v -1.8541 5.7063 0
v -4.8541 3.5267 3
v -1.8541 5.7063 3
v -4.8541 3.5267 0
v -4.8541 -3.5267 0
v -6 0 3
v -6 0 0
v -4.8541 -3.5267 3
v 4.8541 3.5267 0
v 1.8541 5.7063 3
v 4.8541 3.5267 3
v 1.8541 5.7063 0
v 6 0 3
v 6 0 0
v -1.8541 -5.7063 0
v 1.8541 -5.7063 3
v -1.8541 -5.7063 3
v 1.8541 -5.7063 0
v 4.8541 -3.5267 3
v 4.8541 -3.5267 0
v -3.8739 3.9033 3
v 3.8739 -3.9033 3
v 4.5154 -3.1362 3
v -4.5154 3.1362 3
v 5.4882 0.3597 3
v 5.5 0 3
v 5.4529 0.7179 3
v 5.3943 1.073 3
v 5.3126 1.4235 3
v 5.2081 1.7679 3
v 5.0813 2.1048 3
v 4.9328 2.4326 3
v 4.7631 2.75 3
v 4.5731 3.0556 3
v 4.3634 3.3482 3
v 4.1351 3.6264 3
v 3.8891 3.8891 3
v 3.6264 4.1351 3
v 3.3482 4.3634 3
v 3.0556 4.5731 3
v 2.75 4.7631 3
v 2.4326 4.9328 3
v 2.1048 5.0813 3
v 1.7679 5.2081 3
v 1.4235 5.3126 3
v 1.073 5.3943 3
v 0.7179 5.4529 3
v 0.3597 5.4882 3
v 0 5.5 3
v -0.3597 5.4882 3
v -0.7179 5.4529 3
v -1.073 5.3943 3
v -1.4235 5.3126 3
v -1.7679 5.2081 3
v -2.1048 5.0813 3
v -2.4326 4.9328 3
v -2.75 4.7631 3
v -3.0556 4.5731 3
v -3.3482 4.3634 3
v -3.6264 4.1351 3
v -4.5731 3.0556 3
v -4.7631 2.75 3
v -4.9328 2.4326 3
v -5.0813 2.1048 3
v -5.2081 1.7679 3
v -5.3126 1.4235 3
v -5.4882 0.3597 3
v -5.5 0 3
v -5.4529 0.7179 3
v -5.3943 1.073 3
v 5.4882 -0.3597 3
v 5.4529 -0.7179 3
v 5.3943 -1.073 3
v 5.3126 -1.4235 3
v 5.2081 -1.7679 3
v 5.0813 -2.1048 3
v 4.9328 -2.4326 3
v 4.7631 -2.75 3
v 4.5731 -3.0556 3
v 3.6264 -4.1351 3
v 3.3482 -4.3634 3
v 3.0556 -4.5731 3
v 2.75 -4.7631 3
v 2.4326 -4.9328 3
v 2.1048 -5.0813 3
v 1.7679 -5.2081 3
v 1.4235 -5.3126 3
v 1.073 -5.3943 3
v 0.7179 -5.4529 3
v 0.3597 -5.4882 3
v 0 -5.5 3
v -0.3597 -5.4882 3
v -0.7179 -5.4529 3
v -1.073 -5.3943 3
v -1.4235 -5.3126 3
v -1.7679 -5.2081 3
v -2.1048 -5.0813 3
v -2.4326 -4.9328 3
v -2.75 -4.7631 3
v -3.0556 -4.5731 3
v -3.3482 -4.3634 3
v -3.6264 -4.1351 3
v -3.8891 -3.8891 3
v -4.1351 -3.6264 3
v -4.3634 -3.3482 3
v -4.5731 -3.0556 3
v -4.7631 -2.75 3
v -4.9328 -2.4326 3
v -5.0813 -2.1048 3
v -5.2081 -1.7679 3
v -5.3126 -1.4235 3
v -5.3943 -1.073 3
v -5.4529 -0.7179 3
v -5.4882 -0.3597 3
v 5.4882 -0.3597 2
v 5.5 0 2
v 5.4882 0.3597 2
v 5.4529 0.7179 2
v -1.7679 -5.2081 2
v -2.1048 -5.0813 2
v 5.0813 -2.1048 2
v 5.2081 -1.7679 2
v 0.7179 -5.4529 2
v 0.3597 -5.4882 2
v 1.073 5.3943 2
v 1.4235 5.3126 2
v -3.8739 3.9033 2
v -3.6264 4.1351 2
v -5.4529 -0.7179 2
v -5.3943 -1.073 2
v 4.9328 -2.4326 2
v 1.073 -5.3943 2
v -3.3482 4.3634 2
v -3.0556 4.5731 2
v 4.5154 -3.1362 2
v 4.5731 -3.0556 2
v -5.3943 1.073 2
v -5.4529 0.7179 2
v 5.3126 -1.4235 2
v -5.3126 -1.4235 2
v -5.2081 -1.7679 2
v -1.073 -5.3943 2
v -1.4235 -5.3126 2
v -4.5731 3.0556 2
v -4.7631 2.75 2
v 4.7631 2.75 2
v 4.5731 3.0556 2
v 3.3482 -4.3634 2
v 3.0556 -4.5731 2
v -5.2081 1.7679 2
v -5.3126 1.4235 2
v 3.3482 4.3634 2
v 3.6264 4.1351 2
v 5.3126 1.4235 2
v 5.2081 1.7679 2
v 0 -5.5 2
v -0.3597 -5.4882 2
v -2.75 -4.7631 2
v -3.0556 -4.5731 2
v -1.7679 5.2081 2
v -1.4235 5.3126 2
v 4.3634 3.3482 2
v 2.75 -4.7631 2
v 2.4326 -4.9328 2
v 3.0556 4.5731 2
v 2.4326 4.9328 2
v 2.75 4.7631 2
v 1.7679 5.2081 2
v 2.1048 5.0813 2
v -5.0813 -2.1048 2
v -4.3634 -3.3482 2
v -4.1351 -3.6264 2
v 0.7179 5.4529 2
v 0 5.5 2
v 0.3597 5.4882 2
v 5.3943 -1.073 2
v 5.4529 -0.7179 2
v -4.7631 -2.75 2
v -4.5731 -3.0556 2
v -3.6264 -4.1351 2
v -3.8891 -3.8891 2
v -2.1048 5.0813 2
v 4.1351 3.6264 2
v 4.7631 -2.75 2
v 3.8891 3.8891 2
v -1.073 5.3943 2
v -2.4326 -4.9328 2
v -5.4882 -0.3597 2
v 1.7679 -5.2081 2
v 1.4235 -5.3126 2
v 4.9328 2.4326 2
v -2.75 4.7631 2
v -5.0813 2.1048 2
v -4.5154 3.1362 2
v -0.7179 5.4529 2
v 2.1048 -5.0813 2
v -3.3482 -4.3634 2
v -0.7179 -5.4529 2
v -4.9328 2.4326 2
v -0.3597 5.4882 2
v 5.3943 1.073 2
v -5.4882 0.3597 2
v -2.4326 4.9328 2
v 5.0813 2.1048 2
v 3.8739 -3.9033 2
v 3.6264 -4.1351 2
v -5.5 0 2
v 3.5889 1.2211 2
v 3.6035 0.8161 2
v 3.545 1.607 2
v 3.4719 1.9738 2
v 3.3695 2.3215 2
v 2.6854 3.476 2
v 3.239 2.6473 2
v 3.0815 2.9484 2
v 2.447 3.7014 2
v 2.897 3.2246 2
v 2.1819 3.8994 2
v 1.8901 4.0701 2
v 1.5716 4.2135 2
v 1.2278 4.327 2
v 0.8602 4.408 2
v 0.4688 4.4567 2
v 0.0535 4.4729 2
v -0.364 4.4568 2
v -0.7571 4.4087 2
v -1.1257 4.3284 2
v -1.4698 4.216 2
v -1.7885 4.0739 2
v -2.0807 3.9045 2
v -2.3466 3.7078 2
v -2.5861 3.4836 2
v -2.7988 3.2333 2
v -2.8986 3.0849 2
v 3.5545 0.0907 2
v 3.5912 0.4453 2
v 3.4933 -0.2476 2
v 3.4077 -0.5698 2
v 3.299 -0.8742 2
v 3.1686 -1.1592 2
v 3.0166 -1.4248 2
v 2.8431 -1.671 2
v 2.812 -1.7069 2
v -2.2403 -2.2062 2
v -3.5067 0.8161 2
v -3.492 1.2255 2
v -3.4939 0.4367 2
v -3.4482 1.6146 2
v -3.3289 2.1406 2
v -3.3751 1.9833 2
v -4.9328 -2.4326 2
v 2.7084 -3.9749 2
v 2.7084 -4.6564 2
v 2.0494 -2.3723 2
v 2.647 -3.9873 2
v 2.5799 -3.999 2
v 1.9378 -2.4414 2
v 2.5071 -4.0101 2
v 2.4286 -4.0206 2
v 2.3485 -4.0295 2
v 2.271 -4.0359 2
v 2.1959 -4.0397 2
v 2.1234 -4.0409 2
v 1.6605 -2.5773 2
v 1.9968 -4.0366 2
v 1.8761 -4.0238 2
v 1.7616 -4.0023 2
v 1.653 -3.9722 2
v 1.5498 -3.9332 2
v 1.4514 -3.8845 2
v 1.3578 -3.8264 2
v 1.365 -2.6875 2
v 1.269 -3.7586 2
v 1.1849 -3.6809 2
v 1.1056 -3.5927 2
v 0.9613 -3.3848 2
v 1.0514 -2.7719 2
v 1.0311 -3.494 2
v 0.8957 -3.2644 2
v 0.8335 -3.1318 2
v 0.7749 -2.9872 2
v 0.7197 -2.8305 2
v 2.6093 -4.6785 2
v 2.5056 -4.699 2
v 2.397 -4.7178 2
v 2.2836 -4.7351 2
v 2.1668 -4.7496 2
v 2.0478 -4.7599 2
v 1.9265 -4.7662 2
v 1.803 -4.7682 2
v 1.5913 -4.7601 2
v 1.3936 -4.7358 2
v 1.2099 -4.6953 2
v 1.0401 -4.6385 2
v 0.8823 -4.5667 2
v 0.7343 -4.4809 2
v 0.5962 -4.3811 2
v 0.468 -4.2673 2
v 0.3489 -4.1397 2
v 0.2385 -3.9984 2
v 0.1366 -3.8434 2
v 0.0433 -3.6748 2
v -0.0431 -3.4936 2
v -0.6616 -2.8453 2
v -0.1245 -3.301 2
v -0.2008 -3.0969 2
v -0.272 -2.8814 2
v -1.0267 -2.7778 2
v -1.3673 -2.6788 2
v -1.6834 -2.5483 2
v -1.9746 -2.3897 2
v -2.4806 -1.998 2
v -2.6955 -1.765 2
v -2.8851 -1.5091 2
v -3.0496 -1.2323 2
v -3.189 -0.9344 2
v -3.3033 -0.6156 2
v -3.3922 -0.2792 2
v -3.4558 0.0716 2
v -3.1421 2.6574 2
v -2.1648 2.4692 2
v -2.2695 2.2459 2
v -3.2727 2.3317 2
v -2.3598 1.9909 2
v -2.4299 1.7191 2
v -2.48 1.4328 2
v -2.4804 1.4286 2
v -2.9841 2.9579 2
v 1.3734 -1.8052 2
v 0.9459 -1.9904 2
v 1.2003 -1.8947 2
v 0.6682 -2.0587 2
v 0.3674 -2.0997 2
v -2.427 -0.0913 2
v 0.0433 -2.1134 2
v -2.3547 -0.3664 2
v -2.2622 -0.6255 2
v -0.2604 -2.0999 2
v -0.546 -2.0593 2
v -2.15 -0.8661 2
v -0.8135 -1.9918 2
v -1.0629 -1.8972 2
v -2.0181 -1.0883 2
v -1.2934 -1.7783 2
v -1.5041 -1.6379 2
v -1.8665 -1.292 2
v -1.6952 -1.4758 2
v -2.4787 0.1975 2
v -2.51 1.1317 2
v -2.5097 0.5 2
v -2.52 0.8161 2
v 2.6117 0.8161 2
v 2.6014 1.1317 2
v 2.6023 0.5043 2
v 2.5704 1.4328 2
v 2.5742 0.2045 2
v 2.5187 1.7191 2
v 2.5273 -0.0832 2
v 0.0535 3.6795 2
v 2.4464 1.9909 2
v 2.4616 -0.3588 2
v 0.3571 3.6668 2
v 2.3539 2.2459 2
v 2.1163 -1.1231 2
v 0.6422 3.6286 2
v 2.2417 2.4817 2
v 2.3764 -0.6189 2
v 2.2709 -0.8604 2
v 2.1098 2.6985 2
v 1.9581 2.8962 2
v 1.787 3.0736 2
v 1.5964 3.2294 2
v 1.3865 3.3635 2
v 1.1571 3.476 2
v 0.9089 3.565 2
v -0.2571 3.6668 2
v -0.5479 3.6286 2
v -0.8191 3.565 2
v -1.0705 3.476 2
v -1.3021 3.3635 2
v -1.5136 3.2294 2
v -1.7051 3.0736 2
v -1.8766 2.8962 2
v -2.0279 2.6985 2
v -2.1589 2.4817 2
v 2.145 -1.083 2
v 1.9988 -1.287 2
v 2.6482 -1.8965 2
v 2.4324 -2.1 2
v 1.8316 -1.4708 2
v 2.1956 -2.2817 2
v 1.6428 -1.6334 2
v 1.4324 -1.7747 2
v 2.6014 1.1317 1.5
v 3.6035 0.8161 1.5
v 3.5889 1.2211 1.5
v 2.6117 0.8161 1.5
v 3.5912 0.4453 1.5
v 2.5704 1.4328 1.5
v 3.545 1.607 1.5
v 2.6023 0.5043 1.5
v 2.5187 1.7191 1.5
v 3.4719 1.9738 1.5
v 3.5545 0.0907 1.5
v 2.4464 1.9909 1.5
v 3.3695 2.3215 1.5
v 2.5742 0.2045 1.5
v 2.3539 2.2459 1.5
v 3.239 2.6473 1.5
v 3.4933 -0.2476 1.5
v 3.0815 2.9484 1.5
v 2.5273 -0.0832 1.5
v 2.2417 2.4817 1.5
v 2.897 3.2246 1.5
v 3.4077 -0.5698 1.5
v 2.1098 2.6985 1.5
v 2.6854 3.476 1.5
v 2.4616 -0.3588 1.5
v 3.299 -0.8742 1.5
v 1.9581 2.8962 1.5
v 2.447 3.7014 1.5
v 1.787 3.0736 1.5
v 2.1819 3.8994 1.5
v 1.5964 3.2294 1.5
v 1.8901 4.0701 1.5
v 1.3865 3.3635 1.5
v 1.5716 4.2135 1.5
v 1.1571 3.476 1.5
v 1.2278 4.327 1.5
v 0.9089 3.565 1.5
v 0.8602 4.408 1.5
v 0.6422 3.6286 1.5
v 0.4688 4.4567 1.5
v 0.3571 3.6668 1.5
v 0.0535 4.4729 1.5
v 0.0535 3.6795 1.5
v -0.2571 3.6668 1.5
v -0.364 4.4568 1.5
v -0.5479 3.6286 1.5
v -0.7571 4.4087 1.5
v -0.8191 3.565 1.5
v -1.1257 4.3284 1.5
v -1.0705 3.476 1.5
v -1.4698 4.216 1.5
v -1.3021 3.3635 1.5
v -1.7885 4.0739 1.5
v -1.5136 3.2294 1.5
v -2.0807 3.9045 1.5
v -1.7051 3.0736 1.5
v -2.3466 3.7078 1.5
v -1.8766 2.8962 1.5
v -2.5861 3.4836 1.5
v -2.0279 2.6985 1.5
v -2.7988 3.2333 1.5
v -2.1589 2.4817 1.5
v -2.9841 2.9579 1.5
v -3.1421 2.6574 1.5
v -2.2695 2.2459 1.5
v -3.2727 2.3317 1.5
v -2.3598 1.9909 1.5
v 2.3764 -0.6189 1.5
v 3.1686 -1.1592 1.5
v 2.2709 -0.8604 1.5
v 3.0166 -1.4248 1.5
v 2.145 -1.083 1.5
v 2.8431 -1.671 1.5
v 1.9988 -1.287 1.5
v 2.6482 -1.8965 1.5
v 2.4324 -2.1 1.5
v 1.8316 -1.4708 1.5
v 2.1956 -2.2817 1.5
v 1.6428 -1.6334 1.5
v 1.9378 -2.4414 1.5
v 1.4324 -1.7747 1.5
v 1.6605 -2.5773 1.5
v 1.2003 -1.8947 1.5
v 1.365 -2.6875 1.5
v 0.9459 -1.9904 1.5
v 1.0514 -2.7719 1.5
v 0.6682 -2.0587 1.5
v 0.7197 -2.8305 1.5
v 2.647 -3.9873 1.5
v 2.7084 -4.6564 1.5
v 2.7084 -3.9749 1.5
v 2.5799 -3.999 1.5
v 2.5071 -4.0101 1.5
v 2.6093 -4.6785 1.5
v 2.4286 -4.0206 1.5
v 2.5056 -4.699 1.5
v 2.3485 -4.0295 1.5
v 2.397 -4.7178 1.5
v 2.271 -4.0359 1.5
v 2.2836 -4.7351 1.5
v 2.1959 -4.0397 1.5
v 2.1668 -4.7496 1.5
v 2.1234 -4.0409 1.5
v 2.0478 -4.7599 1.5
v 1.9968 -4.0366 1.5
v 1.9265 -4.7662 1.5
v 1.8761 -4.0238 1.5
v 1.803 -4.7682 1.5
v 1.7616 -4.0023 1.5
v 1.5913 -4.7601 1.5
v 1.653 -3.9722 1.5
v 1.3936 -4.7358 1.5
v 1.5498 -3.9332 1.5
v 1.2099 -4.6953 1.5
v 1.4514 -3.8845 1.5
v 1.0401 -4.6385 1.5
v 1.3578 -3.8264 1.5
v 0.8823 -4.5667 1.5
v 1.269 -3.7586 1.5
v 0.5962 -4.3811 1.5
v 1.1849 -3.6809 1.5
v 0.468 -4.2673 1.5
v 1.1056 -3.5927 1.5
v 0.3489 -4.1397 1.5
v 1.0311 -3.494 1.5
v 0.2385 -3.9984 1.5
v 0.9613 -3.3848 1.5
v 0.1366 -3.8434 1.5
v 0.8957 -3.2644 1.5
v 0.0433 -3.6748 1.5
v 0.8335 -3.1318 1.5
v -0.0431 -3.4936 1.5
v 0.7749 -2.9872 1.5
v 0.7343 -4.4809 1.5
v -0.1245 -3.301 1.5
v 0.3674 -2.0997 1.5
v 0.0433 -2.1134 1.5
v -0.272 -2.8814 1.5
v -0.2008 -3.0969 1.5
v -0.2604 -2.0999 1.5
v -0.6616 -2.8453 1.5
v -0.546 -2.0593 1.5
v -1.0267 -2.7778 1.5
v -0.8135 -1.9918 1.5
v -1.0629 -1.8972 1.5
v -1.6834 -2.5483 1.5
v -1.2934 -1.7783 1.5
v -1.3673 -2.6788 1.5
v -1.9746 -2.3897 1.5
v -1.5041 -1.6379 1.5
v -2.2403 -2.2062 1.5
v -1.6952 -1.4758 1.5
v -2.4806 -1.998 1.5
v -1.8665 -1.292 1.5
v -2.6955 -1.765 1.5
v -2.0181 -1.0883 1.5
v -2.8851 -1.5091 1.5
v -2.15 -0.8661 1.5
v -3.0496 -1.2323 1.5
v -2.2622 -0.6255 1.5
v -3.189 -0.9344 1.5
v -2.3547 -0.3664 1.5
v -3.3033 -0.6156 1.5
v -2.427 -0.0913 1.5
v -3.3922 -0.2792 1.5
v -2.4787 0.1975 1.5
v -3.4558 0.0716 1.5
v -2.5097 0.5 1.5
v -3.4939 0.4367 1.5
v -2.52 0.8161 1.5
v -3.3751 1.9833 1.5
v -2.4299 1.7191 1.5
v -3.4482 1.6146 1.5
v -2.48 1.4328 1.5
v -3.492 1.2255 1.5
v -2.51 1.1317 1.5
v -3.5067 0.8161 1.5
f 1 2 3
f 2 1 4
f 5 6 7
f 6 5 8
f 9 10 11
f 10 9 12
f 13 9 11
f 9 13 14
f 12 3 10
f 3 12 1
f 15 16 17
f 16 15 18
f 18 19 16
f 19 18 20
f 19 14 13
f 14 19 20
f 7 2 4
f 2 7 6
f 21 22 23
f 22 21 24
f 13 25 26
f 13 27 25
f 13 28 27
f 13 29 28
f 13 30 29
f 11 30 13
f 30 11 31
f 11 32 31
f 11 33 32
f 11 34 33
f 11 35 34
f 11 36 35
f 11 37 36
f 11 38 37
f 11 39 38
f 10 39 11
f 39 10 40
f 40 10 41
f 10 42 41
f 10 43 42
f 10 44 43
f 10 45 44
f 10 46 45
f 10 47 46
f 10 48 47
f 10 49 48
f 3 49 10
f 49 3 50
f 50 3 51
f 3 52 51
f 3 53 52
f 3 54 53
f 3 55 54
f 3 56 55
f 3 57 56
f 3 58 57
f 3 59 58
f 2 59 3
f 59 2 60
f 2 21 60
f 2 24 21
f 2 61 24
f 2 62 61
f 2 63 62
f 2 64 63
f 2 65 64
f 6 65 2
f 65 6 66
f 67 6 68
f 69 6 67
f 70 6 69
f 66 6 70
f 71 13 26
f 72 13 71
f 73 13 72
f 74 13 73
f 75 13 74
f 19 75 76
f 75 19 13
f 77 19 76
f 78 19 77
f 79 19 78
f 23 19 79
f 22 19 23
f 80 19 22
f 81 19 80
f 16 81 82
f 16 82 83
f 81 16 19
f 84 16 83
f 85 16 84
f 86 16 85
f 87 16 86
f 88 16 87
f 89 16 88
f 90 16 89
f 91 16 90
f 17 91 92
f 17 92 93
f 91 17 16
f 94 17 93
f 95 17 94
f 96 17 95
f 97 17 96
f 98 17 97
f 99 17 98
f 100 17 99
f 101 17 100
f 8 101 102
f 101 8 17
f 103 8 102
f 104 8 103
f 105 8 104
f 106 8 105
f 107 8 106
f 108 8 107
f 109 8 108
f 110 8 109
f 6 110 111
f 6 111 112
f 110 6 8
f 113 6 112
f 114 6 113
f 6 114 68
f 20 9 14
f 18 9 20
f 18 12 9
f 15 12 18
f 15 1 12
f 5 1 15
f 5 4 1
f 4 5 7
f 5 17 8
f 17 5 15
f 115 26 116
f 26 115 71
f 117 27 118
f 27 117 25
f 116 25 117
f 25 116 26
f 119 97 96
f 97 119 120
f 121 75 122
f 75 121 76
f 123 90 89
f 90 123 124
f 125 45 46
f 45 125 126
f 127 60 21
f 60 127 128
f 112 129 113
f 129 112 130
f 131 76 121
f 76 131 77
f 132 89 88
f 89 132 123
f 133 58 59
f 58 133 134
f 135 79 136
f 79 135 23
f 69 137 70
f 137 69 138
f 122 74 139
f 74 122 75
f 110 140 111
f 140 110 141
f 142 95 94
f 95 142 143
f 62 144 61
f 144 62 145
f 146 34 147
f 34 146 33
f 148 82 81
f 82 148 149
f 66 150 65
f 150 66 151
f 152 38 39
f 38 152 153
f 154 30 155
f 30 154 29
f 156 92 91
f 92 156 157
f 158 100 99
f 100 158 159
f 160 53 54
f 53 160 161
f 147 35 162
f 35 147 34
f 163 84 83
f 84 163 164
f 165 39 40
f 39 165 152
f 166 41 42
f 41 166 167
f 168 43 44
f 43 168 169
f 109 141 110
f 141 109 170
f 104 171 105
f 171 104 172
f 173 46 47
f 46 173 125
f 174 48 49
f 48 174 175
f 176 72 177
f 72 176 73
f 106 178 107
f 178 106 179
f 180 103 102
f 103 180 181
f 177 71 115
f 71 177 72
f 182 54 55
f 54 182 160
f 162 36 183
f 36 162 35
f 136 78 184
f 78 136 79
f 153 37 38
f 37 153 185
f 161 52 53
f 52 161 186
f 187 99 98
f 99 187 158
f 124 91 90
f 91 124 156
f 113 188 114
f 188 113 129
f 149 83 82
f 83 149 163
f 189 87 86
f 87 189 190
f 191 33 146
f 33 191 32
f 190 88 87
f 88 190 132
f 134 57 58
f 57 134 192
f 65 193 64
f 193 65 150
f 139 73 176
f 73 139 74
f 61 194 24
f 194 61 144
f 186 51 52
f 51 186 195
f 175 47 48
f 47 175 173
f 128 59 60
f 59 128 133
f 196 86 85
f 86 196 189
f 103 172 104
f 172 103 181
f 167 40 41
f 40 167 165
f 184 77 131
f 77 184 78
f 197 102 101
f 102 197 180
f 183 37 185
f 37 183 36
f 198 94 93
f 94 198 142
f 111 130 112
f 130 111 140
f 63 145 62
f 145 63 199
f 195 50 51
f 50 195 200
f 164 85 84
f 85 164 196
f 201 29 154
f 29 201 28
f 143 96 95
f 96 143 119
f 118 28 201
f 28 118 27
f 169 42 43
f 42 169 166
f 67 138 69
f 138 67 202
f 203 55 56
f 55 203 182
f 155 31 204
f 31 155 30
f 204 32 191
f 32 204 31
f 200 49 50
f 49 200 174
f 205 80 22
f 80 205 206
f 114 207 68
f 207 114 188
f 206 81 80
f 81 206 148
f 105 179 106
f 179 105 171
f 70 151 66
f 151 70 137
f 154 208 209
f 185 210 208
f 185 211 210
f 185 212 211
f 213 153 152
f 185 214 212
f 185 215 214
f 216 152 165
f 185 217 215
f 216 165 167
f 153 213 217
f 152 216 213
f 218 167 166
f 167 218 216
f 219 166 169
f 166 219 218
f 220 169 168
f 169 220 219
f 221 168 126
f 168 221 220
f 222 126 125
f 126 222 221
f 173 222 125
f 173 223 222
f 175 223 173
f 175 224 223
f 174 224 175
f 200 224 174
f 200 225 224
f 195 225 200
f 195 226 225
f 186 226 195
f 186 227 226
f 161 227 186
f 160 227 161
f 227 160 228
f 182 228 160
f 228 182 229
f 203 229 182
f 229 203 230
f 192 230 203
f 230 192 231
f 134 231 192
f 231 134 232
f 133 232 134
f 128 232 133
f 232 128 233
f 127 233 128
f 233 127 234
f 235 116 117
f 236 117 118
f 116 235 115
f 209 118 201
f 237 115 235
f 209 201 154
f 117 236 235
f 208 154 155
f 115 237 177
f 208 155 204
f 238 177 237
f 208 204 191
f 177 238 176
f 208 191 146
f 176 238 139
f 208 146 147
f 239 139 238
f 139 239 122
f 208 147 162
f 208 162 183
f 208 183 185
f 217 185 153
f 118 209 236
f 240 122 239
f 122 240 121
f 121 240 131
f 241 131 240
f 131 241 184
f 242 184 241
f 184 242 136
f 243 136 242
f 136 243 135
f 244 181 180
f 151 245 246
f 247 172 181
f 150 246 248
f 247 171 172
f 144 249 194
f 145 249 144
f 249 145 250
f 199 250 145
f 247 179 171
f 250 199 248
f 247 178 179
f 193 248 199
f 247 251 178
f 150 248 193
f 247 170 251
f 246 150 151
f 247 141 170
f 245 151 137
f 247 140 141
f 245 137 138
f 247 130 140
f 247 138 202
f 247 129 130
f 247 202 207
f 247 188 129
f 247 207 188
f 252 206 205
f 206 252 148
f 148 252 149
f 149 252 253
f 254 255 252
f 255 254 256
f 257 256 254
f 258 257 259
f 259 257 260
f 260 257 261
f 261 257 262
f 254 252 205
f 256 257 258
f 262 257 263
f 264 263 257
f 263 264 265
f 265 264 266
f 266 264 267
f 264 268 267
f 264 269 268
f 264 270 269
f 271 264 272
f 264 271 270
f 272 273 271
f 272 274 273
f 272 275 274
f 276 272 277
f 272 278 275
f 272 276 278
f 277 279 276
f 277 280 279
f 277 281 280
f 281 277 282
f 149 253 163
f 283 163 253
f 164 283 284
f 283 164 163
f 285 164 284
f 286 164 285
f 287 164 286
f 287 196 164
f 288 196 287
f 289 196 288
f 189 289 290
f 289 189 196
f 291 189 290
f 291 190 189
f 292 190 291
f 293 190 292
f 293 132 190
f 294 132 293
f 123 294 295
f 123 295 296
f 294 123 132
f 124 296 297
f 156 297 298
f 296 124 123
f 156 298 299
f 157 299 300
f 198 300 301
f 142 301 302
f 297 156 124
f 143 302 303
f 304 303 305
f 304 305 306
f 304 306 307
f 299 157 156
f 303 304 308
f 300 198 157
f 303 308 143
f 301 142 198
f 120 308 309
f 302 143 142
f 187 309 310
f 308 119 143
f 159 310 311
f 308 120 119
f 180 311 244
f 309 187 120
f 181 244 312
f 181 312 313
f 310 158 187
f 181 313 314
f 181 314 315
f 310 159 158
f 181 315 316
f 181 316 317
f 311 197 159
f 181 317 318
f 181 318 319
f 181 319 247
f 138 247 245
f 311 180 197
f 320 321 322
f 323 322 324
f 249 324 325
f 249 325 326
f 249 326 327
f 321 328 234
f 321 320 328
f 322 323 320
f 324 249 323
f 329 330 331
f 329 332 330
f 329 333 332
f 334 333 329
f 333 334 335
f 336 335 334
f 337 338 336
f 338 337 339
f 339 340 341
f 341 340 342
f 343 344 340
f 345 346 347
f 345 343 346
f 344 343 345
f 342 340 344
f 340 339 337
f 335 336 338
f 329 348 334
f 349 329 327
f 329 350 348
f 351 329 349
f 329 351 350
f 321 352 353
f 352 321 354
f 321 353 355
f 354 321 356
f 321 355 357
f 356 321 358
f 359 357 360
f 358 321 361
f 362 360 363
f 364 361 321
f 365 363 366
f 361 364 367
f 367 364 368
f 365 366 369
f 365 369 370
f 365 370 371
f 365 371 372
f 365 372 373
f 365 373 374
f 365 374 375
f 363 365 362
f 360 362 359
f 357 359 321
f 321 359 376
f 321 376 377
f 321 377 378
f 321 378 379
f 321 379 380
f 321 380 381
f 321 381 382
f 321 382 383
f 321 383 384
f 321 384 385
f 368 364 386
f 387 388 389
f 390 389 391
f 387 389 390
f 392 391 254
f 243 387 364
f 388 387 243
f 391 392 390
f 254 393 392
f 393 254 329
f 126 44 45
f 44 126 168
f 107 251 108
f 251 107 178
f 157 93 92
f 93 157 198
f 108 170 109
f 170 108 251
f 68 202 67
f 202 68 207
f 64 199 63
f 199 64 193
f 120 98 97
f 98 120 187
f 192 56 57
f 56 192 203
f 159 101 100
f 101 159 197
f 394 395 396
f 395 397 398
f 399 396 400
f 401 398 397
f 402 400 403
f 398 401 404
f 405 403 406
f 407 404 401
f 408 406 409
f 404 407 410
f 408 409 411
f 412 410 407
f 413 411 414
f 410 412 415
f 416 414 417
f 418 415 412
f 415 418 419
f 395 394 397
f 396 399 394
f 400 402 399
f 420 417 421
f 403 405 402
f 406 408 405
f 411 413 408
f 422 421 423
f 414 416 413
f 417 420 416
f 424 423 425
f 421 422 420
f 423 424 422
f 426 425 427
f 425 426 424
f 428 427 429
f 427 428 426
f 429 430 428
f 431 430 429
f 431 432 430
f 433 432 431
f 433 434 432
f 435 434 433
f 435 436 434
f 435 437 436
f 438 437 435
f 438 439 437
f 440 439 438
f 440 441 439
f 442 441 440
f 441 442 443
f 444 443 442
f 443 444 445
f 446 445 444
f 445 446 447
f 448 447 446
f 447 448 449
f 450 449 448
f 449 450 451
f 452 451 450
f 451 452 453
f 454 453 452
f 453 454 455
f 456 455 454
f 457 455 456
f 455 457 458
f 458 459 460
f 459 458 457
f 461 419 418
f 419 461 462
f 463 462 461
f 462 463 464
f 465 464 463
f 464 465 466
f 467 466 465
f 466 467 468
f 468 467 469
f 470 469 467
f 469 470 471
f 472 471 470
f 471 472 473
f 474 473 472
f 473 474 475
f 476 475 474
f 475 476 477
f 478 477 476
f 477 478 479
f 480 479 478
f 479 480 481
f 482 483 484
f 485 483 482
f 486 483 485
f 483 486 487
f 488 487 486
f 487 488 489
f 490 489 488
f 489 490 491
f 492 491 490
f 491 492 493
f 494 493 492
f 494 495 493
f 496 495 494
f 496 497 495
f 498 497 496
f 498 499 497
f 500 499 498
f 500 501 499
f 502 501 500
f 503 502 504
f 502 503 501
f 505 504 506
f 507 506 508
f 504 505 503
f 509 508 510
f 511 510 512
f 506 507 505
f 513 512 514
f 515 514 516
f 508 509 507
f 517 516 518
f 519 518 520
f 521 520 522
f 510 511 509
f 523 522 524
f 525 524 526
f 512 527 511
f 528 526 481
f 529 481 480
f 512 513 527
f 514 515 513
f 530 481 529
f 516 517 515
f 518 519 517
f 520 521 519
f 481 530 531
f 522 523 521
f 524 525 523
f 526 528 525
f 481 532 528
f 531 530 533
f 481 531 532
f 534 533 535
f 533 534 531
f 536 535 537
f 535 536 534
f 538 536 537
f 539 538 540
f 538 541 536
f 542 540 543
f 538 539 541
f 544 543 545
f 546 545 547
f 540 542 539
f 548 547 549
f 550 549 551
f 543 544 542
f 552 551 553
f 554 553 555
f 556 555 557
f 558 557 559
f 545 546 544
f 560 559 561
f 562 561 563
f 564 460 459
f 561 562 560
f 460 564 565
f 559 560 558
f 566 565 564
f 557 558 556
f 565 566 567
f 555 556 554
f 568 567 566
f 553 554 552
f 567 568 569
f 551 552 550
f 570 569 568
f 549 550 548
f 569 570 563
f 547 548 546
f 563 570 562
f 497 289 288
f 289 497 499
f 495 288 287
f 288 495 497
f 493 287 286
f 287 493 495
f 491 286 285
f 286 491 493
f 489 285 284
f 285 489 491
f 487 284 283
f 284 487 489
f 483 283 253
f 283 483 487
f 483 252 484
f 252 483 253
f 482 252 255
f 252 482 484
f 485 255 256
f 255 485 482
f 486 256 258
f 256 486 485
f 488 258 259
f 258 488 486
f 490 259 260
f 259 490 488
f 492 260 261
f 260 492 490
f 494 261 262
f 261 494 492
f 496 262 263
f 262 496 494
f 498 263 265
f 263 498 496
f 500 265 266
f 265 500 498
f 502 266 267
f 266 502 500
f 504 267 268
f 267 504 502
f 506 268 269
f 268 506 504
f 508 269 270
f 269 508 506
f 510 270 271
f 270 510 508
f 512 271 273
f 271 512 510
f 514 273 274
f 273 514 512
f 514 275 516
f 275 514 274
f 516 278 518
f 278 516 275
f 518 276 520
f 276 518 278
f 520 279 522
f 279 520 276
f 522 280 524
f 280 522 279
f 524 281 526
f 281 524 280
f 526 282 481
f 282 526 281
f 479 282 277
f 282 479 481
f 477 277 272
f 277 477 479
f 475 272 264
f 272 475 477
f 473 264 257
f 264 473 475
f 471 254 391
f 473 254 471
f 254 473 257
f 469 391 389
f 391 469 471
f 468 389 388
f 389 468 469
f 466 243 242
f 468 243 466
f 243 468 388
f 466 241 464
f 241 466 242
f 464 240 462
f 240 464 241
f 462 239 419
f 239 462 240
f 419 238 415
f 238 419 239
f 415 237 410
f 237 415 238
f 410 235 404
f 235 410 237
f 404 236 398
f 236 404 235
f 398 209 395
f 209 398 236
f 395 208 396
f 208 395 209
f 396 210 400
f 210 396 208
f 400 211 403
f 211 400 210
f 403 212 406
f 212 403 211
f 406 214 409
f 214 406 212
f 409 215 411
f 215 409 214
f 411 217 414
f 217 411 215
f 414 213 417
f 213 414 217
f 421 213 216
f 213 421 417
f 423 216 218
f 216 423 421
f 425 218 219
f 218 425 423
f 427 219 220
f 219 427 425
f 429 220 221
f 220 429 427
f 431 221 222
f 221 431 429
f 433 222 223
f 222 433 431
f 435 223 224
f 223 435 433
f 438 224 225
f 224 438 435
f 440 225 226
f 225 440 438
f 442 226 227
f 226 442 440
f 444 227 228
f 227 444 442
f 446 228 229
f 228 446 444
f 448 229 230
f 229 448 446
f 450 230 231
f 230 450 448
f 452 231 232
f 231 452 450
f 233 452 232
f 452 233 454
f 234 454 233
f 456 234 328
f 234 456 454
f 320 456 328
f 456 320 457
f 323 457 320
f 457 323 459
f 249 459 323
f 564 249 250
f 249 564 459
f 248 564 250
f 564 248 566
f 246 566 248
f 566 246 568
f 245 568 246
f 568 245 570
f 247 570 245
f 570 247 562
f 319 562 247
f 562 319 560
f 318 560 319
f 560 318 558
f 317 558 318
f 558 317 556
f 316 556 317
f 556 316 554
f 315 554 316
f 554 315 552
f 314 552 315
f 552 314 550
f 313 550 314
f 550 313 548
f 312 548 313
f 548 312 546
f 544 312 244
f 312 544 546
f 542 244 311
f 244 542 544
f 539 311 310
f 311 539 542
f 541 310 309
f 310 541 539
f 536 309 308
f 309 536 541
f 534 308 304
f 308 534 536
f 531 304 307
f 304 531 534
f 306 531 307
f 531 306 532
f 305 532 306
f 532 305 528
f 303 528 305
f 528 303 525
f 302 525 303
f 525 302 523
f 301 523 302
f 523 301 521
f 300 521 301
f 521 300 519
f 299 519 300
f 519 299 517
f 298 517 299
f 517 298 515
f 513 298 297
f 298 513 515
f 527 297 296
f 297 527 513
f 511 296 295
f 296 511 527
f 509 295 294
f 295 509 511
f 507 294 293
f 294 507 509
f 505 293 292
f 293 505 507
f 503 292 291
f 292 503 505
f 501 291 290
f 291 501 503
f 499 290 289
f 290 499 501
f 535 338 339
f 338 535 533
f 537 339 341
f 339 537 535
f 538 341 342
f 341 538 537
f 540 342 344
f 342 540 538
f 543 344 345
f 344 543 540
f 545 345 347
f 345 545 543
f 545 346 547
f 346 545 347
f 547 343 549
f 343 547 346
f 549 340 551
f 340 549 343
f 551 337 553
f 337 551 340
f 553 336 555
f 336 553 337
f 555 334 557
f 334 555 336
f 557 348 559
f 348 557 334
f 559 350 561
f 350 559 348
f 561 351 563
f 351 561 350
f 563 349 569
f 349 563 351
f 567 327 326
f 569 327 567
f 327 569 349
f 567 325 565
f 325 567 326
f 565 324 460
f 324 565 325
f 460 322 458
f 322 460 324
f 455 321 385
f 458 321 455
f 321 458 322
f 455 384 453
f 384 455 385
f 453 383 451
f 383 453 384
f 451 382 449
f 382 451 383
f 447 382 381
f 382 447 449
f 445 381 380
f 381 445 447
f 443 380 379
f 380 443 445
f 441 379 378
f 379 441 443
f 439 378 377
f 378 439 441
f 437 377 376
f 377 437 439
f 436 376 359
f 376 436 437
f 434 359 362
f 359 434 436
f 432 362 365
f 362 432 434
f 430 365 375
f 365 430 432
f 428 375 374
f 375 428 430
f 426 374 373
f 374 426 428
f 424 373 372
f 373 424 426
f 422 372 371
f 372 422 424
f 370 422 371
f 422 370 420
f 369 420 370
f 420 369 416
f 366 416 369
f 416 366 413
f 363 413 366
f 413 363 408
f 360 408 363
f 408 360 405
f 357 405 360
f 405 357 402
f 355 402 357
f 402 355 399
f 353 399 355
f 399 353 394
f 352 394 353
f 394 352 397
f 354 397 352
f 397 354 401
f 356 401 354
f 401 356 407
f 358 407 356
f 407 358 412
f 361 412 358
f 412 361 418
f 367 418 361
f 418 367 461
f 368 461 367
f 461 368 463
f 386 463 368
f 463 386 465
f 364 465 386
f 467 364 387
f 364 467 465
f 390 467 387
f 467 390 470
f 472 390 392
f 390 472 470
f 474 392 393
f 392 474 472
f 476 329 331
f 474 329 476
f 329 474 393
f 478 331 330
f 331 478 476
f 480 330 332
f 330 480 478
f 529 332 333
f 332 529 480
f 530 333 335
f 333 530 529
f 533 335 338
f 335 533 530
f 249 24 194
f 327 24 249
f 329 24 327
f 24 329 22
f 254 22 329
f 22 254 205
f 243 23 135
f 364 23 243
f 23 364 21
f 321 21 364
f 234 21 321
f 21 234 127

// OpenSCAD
difference() {
    color("blue")
    difference() {
        cylinder(d=12,h=3,$fn=10);
        translate([0,0,2])
        cylinder(d=11,h=1.5,$fn=96);
    }
    translate([-4,-2.8,1.5])
    color("gold")
    linear_extrude(1)
    text("Q", size=7.5);
}

rotate([0,0,50])
translate([0,0,2.5])
color("blue")
cube([1,11,1], center=true);
